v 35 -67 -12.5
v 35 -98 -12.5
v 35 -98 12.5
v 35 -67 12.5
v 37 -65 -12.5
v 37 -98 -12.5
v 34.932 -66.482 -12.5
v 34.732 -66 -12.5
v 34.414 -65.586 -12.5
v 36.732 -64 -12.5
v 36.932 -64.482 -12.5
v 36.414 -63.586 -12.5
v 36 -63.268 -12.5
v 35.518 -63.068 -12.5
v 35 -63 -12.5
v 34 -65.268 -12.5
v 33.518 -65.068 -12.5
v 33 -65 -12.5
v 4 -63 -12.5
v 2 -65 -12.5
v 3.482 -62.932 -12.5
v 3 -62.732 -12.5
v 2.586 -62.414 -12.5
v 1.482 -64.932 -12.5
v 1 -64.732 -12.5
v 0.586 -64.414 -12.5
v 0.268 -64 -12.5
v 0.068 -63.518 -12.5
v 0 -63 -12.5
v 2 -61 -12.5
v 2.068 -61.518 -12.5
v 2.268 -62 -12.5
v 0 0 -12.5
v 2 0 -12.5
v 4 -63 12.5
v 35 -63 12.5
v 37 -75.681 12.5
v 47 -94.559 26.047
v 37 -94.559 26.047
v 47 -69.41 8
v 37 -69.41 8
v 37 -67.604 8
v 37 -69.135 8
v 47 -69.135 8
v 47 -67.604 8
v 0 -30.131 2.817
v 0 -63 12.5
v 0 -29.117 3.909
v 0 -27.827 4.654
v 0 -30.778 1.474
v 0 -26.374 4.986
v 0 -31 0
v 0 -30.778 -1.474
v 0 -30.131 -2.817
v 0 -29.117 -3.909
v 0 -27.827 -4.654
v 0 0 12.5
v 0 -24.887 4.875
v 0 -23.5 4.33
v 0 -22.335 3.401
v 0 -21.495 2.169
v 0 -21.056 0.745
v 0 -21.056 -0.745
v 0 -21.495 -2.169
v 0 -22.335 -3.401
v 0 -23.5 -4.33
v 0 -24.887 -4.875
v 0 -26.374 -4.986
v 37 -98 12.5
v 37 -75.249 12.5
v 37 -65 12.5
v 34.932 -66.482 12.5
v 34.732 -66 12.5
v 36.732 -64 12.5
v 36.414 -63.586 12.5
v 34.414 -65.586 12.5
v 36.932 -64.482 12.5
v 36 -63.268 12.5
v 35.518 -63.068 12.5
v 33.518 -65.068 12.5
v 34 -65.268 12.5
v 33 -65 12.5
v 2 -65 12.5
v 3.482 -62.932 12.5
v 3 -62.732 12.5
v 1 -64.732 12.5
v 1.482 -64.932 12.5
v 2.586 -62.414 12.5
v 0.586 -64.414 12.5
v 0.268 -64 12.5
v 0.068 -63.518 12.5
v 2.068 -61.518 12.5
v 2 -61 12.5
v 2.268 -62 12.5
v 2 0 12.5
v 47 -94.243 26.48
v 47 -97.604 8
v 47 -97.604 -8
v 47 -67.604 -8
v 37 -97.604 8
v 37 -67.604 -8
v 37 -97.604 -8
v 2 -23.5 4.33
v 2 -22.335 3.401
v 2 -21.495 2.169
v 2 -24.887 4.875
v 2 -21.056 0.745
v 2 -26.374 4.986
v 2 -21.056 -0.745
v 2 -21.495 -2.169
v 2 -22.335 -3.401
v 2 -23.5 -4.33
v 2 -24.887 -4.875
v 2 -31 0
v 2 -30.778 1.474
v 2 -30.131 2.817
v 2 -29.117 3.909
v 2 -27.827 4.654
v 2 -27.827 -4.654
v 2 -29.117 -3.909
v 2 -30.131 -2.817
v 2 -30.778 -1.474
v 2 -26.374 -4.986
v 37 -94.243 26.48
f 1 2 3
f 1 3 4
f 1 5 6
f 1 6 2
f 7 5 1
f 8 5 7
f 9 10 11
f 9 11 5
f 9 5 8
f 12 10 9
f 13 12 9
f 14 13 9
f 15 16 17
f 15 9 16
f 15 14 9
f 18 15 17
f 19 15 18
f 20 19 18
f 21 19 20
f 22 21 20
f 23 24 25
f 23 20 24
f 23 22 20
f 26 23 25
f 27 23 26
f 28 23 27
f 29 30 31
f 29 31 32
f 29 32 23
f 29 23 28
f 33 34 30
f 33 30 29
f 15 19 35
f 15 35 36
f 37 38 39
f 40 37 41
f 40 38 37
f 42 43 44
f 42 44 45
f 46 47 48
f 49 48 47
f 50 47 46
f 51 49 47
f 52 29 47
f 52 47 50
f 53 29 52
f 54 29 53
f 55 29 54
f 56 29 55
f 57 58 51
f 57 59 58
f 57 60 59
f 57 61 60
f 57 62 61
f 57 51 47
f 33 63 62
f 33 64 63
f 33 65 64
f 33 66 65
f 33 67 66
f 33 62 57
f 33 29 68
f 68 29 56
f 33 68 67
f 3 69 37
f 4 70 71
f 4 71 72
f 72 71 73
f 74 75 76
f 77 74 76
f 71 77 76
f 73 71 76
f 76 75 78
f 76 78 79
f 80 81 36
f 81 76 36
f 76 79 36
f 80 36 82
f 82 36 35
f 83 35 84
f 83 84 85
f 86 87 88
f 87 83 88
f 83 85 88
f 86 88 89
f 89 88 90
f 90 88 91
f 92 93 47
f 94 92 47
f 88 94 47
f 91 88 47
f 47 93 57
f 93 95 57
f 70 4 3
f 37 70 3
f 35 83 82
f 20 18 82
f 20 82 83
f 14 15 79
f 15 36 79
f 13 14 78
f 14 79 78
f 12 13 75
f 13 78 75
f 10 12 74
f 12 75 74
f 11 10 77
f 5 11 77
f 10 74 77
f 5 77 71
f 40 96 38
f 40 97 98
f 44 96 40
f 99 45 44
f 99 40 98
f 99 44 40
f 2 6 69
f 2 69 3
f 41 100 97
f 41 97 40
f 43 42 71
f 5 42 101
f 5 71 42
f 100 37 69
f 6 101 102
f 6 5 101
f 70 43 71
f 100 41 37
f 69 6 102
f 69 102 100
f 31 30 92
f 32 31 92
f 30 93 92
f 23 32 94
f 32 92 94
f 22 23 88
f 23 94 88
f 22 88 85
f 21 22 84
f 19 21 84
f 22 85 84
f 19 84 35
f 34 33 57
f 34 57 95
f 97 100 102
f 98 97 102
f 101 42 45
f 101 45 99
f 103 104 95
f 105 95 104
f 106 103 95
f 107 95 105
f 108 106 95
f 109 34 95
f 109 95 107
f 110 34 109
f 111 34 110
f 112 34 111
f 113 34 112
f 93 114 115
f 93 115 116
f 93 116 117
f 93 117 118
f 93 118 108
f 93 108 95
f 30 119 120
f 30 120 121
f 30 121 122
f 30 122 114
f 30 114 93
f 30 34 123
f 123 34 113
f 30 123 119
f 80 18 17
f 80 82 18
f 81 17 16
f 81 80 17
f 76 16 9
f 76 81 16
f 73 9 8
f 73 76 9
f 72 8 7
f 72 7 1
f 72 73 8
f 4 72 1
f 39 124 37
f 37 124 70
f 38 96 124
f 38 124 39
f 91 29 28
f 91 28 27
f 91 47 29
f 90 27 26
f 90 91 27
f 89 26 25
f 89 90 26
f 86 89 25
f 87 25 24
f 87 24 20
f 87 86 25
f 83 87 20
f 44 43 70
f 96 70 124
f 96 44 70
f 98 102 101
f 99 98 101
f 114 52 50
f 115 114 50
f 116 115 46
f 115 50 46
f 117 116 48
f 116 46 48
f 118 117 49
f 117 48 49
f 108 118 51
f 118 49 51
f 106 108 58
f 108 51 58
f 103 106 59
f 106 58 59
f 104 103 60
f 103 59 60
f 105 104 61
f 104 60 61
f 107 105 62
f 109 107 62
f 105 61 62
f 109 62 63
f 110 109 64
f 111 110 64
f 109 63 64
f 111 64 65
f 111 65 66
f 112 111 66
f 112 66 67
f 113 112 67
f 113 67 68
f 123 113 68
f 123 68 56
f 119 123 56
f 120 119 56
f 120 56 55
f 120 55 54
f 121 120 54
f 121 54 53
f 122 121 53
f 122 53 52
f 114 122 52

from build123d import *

# Parameters (mm, degrees)
BOSS_EXTRUDE1_DEPTH      = 12.5
BOSS_EXTRUDE1_DEPTH_BACK = 12.5
F_10_0MM_DOWEL_HOLE1_D   = 10
FILLET1_R                = 2
SKETCH3_W                = 16
SKETCH3_H                = 30
BOSS_EXTRUDE2_DEPTH      = 10
BOSS_EXTRUDE3_DEPTH      = 10


with BuildPart() as part:
    # Sketch1 → Boss-Extrude1 (new, two sides: drawn at the far end of the back side and taken through both)
    with BuildSketch(Plane.XY.offset(-BOSS_EXTRUDE1_DEPTH_BACK)):
        Polygon((0, 0), (2, 0), (2, -63), (37, -63), (37, -98), (35, -98), (35, -65), (0, -65), align=None)
    extrude(amount=BOSS_EXTRUDE1_DEPTH + BOSS_EXTRUDE1_DEPTH_BACK)

    # Ø10.0mm Dowel Hole1 (through all)
    with Locations(Plane(origin=(2, -26, 0), x_dir=(0, 1, 0), z_dir=(1, 0, 0))):
        with Locations((0, 0)):
            Hole(F_10_0MM_DOWEL_HOLE1_D / 2)

    # Fillet1
    fillet1_edges = [part.edges().sort_by_distance(p)[0] for p in [
        (2, -63, 0),
        (37, -63, 0),
        (35, -65, 0),
        (0, -65, 0),
    ]]
    fillet(fillet1_edges, radius=FILLET1_R)

    # Sketch3 → Boss-Extrude2 (add)
    with BuildSketch(Plane(origin=(37, 0, 0), x_dir=(0, 0, -1), z_dir=(1, 0, 0))):
        with Locations((0, -82.60435288)):
            Rectangle(SKETCH3_W, SKETCH3_H)
    extrude(amount=BOSS_EXTRUDE2_DEPTH)

    # Sketch4 → Boss-Extrude3 (add)
    with BuildSketch(Plane(origin=(47, 0, 0), x_dir=(0, 0, -1), z_dir=(1, 0, 0))):
        Polygon((-8, -69.135252509), (-26.480043417, -94.242566668), (-26.046645408, -94.559298491), (-8, -69.410399443), align=None)
    extrude(amount=-BOSS_EXTRUDE3_DEPTH)


solid = part.part
